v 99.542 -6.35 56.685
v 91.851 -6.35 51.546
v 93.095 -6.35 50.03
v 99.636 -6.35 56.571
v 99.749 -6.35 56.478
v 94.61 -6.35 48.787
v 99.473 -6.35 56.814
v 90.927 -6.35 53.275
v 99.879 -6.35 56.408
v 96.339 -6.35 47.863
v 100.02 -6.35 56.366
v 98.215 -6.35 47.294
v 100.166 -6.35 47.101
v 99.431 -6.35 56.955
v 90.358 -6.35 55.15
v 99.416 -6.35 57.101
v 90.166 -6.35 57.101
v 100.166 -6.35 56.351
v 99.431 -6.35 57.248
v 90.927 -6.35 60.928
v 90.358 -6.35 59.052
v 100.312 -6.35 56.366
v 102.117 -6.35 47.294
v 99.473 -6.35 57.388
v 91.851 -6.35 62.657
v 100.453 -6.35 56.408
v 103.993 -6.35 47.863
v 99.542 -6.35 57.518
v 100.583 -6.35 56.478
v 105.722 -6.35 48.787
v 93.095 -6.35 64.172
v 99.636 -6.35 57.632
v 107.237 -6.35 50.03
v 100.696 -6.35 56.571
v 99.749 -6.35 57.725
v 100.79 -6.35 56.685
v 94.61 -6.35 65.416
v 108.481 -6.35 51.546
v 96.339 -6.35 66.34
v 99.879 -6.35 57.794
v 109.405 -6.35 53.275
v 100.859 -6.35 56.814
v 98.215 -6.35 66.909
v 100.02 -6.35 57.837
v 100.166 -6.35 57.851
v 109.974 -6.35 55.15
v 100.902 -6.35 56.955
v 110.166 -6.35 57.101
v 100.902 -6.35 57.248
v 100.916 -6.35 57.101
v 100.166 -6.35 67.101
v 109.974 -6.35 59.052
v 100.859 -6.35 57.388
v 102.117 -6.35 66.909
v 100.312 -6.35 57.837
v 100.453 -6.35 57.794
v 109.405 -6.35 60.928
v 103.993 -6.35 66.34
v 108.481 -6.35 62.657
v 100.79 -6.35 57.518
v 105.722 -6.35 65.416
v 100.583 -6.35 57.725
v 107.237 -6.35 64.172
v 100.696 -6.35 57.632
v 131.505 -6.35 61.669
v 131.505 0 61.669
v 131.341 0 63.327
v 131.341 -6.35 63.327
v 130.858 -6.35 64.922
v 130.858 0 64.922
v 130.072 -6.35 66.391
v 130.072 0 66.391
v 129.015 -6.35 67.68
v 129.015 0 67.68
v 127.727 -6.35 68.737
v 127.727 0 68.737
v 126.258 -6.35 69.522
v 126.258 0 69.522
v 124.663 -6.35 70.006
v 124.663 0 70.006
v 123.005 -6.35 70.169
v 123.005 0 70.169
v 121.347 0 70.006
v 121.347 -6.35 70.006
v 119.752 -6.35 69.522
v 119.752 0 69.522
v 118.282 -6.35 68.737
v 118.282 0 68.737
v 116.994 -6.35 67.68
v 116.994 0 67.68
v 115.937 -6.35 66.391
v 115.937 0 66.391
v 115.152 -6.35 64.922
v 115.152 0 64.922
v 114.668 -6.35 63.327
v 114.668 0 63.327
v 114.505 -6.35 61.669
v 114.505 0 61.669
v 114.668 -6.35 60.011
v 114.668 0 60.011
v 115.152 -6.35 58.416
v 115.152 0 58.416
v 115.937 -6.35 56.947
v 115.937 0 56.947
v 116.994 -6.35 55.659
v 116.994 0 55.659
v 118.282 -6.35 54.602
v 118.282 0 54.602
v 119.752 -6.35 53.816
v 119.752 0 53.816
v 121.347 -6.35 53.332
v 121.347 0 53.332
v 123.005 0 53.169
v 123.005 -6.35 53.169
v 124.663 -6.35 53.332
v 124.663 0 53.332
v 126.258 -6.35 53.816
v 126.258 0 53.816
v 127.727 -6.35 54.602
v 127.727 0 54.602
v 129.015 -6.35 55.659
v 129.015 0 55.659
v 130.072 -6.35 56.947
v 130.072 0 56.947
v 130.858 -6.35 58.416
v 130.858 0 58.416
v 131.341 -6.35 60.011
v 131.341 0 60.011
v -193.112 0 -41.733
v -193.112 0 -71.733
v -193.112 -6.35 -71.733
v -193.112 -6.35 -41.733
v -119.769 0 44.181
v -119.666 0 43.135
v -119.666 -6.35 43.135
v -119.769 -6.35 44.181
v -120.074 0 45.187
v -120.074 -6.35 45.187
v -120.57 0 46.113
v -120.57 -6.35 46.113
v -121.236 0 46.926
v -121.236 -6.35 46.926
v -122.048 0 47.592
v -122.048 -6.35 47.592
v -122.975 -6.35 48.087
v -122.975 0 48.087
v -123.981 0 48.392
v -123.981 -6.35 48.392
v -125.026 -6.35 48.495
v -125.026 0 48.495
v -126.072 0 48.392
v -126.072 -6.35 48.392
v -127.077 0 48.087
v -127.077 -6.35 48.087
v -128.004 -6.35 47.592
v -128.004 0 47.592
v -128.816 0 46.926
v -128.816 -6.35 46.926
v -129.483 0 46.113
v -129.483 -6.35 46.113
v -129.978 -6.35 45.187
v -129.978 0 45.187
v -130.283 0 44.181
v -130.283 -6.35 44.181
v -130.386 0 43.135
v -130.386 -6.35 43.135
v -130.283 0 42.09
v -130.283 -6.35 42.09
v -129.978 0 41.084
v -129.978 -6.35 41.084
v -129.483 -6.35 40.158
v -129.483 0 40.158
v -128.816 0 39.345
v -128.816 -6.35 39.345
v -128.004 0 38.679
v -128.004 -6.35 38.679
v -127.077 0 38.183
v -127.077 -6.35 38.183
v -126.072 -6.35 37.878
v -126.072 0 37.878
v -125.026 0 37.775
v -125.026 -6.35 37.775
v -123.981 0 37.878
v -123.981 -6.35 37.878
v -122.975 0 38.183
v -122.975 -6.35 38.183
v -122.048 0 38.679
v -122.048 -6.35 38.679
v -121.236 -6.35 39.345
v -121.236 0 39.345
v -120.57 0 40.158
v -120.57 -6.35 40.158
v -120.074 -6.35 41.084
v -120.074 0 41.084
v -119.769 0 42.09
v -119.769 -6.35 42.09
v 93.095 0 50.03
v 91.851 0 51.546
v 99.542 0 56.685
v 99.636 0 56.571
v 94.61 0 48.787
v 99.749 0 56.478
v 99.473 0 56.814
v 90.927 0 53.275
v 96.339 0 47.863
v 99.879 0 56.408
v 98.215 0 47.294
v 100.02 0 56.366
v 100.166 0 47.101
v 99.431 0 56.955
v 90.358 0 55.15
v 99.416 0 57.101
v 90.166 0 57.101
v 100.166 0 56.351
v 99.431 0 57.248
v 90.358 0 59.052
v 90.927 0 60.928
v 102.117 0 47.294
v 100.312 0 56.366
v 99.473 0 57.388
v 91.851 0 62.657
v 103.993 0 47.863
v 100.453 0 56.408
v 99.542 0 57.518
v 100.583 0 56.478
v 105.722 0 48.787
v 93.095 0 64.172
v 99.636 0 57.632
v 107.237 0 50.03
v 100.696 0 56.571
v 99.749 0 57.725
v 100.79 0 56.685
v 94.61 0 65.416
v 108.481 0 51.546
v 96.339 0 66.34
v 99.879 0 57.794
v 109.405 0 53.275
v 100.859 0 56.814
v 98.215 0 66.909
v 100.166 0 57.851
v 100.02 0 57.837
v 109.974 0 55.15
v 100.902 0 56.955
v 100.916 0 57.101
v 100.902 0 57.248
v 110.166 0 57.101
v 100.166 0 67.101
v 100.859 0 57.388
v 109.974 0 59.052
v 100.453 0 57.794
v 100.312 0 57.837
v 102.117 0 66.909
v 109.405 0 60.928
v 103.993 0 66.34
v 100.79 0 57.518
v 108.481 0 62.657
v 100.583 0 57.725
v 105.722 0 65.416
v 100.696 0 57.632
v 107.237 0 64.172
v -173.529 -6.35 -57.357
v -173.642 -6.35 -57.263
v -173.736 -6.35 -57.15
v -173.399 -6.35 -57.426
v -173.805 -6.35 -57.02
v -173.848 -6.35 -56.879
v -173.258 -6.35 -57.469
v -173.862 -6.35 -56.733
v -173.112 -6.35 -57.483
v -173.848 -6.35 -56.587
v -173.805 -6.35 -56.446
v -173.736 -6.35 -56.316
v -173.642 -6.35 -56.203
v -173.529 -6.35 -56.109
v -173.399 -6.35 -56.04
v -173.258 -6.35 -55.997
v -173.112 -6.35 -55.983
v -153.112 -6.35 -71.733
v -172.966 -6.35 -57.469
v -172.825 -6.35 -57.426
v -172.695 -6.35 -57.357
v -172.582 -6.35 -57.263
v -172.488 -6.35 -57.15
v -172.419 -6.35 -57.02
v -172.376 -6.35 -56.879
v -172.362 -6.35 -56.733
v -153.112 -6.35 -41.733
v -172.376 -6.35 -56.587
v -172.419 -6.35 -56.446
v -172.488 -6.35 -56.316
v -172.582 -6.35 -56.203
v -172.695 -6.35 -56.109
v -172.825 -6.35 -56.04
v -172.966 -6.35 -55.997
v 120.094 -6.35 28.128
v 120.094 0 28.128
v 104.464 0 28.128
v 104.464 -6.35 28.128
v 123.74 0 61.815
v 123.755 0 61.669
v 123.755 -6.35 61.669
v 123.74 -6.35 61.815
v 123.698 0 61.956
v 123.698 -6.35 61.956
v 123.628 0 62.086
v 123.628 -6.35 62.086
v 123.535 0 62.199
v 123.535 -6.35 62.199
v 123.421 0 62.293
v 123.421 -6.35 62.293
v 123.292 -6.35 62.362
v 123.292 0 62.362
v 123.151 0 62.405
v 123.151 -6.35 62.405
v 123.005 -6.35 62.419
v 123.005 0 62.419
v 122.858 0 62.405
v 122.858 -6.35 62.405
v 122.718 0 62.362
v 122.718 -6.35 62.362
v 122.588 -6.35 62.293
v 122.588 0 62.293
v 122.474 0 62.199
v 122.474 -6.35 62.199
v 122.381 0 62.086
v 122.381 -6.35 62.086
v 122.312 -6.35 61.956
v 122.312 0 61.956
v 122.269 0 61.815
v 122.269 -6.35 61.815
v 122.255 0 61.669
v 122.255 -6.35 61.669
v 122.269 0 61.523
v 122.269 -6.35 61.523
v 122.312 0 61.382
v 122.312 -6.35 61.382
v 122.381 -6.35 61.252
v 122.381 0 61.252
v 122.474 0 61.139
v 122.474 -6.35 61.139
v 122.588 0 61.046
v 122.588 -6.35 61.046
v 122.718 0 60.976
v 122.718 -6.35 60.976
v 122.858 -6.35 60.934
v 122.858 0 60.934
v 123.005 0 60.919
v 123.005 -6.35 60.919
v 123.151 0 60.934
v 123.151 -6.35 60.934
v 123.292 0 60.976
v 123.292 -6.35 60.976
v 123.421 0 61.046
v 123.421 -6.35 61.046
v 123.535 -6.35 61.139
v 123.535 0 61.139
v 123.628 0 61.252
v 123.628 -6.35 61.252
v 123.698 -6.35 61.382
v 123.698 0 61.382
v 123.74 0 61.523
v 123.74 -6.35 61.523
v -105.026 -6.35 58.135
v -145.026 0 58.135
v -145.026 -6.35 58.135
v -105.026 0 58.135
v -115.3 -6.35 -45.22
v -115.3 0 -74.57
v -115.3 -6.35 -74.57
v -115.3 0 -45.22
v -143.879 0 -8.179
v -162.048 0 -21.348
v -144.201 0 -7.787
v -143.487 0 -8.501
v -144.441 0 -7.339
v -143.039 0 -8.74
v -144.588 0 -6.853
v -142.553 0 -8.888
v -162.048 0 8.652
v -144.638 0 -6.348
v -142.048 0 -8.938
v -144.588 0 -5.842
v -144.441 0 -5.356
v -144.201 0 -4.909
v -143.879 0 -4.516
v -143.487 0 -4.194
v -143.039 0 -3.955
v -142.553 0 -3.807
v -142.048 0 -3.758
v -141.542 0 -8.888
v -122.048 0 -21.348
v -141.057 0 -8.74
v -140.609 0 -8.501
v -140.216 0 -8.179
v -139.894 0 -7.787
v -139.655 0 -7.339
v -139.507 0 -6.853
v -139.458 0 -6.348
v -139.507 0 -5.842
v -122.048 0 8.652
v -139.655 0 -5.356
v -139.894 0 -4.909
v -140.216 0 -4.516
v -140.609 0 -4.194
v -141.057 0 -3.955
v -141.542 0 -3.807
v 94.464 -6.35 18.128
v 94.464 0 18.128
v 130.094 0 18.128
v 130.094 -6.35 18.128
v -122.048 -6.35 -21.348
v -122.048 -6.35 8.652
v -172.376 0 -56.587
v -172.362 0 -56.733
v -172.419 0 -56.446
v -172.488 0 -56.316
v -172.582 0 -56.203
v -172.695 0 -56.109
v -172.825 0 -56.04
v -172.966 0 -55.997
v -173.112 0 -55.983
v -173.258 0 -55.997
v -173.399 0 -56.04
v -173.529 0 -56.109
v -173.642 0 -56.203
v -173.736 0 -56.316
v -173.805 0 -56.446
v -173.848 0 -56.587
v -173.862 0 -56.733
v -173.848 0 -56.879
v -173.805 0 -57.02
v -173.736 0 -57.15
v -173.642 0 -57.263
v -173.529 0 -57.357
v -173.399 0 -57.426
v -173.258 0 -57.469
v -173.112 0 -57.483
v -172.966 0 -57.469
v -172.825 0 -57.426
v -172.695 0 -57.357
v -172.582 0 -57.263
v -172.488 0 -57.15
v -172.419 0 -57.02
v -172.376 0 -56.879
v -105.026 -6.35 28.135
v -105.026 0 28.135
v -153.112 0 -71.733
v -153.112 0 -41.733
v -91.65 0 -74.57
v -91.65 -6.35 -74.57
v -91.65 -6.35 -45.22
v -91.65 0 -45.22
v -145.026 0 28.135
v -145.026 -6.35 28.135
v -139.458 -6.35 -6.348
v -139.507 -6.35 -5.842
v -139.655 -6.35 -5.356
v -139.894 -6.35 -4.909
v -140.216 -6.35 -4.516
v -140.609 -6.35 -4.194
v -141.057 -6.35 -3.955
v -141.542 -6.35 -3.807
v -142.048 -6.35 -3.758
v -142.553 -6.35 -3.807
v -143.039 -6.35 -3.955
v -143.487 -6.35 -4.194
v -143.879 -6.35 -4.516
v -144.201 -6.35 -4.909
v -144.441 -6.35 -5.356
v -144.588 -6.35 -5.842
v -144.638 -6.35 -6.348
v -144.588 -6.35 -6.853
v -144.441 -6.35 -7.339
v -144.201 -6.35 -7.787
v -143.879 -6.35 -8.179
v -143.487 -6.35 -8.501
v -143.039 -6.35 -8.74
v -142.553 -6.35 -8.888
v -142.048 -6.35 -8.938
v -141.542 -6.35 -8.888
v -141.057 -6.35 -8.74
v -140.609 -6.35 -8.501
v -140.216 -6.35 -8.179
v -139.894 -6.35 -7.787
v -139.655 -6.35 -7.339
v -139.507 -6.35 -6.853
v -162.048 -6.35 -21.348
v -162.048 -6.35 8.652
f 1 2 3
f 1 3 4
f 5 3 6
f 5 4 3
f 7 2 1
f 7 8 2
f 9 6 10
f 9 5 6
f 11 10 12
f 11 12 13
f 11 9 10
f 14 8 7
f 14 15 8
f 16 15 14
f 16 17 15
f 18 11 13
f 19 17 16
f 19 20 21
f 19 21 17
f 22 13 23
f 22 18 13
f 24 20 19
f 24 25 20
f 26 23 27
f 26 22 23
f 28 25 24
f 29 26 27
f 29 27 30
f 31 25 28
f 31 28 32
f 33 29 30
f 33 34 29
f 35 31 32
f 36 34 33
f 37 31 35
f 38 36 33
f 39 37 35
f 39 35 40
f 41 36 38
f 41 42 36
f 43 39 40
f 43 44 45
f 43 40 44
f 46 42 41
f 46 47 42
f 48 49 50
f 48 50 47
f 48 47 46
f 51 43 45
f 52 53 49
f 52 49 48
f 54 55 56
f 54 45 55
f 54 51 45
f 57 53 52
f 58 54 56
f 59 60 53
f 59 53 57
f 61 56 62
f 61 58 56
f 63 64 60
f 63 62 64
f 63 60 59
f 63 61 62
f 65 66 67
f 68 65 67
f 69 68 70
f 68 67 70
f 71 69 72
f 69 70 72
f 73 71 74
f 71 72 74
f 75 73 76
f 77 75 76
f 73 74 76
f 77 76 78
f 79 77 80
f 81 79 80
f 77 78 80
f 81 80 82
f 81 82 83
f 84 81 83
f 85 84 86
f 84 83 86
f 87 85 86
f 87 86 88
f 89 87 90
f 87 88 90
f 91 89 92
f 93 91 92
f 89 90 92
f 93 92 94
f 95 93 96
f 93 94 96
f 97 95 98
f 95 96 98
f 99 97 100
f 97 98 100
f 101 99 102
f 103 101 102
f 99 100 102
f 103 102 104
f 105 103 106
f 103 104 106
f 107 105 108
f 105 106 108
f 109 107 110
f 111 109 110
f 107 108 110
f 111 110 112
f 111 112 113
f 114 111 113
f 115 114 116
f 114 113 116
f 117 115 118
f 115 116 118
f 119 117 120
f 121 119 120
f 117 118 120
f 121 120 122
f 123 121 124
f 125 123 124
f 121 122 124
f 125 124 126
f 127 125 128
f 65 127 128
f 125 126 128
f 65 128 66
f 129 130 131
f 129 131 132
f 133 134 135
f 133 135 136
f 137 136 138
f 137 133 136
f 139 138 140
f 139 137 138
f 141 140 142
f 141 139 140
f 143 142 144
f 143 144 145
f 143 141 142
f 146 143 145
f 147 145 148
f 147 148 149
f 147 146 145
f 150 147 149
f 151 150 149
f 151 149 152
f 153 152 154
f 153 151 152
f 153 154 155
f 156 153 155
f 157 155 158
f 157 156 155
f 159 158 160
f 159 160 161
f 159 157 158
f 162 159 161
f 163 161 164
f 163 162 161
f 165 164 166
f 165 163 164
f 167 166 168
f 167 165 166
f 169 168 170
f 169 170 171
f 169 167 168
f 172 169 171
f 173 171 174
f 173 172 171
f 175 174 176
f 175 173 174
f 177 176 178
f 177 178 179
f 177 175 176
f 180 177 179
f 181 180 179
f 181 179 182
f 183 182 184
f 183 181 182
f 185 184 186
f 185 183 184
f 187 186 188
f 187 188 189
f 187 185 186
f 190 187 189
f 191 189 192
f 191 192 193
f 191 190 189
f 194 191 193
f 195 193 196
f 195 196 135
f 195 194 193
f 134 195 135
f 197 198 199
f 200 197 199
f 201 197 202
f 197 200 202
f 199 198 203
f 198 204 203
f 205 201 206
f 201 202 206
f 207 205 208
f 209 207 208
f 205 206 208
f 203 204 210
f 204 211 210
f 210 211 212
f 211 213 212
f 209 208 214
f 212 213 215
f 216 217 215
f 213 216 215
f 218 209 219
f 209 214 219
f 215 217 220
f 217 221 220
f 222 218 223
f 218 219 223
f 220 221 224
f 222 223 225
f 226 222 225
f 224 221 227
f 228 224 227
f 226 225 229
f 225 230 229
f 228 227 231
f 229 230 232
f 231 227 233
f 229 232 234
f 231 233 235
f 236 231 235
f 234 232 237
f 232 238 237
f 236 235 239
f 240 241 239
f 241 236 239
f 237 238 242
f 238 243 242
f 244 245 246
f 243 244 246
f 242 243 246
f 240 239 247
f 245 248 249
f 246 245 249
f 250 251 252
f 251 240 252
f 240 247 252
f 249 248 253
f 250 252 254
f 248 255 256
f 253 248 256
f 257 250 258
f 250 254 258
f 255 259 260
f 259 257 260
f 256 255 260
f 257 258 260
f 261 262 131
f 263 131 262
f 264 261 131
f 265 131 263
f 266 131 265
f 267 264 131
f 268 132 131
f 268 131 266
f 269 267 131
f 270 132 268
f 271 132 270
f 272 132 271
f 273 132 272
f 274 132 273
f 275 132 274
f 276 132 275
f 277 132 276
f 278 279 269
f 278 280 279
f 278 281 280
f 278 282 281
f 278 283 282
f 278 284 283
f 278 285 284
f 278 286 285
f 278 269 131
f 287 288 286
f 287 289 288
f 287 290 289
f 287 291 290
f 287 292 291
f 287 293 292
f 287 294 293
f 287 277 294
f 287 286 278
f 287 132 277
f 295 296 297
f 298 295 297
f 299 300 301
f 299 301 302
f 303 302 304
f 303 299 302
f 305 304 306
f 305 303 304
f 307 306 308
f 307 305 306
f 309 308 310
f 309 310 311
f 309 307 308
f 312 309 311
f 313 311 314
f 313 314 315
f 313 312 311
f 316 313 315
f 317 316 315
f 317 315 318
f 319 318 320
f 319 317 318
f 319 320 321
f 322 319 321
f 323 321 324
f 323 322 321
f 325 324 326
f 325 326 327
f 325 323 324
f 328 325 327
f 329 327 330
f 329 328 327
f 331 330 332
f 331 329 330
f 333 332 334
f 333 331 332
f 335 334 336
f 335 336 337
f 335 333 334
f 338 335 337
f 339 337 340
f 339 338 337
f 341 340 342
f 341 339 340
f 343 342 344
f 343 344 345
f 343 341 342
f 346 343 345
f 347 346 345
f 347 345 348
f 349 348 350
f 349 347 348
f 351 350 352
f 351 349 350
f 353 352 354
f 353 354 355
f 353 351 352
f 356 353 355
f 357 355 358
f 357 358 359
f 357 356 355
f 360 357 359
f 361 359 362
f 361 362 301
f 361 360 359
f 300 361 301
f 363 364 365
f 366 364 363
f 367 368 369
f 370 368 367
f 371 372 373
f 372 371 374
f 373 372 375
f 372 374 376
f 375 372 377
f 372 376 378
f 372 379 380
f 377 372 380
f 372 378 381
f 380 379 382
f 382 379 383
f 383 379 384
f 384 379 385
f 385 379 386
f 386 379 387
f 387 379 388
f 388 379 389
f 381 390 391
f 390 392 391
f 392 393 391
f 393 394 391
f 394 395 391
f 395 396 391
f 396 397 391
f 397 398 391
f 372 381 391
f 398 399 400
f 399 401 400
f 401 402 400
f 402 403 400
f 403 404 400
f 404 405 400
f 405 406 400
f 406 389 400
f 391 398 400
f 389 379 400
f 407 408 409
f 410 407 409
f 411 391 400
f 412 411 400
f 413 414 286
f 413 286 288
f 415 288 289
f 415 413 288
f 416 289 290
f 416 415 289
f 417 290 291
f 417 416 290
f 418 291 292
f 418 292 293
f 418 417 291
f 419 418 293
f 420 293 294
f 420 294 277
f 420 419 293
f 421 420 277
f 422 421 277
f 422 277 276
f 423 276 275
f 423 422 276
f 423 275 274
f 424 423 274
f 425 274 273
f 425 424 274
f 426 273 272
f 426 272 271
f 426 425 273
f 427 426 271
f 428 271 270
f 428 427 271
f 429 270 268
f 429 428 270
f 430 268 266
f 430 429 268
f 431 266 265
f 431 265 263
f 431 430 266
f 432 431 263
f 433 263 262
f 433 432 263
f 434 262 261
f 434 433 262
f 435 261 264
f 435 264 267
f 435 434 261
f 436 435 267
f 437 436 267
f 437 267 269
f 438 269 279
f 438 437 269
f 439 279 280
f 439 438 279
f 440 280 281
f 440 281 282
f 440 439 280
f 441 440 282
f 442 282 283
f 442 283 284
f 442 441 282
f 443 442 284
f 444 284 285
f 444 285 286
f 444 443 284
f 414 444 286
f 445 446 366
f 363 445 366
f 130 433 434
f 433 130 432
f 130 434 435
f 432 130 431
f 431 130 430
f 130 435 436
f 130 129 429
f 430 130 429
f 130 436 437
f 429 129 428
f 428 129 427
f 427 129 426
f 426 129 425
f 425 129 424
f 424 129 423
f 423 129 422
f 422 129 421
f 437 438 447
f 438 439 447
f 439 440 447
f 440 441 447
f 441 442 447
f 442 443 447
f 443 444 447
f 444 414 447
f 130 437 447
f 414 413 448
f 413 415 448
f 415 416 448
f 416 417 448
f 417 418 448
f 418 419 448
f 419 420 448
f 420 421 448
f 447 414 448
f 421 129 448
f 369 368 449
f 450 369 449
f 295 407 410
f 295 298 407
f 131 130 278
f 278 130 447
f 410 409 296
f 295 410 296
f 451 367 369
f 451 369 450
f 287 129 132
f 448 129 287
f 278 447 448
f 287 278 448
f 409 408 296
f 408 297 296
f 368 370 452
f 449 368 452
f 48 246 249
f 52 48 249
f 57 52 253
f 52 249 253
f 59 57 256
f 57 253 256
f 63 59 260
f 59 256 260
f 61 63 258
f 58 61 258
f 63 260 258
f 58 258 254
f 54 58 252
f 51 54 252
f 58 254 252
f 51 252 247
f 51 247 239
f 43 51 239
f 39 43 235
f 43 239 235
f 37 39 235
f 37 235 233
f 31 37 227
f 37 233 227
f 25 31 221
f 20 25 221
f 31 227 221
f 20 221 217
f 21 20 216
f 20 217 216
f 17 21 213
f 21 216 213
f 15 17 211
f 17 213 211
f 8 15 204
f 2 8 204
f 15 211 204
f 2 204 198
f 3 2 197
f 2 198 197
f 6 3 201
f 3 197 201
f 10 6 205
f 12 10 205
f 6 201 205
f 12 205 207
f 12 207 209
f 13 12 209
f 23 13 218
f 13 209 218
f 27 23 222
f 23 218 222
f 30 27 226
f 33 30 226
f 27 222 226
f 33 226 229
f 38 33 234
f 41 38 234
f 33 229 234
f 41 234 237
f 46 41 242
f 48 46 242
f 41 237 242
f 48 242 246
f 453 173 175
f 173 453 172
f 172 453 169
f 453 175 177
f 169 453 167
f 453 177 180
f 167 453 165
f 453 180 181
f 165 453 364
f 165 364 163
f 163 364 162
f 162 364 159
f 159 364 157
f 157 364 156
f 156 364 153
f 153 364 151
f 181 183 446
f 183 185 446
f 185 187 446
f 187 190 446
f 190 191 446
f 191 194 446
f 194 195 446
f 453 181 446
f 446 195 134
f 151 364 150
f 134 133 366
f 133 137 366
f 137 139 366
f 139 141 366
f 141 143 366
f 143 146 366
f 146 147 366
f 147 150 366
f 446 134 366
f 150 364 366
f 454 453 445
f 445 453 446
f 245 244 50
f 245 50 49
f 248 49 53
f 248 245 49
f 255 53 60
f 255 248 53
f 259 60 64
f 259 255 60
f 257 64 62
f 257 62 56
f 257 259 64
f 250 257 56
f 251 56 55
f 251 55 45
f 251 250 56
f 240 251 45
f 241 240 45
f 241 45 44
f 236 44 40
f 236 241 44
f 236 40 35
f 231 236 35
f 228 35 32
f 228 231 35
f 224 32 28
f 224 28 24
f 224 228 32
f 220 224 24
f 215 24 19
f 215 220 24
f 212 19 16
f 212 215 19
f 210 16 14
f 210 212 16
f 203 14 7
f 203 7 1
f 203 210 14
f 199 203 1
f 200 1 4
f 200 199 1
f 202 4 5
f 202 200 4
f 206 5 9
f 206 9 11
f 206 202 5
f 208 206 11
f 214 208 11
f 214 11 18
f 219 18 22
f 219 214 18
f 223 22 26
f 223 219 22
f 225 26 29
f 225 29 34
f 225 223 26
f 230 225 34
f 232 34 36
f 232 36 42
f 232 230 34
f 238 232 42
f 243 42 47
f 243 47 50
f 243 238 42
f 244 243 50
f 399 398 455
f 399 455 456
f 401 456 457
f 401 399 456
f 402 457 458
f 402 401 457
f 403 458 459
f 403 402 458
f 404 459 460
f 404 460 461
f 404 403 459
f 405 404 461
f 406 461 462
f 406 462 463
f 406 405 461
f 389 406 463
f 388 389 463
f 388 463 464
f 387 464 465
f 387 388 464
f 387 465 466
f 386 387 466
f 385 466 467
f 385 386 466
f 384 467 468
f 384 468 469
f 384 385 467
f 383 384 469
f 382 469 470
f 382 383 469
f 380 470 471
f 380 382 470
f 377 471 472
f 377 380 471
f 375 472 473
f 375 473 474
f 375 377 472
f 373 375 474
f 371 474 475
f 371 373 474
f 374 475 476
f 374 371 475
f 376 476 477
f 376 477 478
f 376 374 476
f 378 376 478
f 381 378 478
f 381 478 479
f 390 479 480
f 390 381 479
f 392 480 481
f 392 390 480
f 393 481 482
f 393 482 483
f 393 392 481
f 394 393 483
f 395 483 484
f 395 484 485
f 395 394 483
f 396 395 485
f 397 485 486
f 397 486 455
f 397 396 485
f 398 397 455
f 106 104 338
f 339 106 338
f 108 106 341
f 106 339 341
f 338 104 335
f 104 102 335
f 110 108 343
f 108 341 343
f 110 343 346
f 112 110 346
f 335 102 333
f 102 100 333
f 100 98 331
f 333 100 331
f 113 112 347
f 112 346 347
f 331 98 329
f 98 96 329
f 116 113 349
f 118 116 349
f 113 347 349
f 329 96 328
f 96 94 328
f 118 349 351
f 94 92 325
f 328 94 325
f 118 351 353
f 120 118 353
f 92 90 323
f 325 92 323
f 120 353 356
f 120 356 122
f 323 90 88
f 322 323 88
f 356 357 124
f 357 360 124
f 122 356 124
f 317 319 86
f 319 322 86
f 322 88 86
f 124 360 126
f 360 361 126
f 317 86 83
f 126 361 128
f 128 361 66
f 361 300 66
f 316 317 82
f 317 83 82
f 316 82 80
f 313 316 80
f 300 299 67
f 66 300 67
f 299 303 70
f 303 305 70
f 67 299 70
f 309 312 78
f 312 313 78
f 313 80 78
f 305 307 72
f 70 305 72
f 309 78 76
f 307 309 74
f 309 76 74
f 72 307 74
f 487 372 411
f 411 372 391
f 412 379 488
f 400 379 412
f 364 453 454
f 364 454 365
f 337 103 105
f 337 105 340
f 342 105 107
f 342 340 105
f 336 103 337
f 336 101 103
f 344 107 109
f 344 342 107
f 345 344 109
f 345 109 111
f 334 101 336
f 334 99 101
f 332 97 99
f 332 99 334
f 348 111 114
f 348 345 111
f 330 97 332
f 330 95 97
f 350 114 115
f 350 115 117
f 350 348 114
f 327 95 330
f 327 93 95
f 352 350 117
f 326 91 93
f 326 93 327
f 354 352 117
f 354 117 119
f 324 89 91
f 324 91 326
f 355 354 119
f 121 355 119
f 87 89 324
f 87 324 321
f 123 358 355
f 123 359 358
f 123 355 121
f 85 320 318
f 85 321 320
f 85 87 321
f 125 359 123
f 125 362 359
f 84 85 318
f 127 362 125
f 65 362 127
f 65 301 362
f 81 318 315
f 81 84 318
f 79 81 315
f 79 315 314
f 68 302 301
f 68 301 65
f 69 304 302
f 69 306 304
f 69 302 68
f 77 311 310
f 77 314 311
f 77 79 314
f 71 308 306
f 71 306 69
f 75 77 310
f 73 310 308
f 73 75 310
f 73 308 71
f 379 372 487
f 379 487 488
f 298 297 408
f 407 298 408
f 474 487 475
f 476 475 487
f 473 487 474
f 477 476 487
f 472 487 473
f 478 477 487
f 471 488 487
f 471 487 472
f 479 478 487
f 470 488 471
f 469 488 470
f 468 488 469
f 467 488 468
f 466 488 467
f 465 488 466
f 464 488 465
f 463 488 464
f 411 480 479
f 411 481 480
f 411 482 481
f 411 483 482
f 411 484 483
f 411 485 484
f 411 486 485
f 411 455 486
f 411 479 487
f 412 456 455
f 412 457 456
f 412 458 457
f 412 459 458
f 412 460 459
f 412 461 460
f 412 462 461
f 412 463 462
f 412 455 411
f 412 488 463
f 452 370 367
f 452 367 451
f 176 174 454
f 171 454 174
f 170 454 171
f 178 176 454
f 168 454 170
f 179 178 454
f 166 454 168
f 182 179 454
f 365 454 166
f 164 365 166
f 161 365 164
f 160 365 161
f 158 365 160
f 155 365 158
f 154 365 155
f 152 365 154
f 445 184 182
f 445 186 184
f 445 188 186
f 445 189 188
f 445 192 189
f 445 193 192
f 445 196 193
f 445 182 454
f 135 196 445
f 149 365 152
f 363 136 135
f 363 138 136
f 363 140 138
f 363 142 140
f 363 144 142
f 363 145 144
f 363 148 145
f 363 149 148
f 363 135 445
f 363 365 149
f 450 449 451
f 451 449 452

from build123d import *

# Parameters (mm, degrees)
F0_W     = 23.65
F0_H     = 29.35
F0_R     = 8.5
F0_R_2   = 0.75
F0_W_2   = 40
F0_H_2   = 30
F0_R_3   = 5.36
F0_R_4   = 2.59
F0_R_5   = 10
F1_DEPTH = 6.35


with BuildPart() as f1:
    # F0 (on Front) → F1 (new body)
    with BuildSketch(Plane.XZ):
        with Locations((-103.474769, -59.894982)):
            Rectangle(F0_W, F0_H)
        with Locations((123.004787, 61.669149)):
            Circle(F0_R)
        with Locations((123.004787, 61.669149)):
            Circle(F0_R_2, mode=Mode.SUBTRACT)
        with Locations((-125.026301, 43.135444)):
            Rectangle(F0_W_2, F0_H_2)
        with Locations((-125.026301, 43.135444)):
            Circle(F0_R_3, mode=Mode.SUBTRACT)
        with Locations((-142.047703, -6.347605)):
            Rectangle(F0_W_2, F0_H_2)
        with Locations((-142.047703, -6.347605)):
            Circle(F0_R_4, mode=Mode.SUBTRACT)
        with Locations((-173.111941, -56.733072)):
            Rectangle(F0_W_2, F0_H_2)
        with Locations((-173.111941, -56.733072)):
            Circle(F0_R_2, mode=Mode.SUBTRACT)
        with Locations((100.166097, 57.101402)):
            Circle(F0_R_5)
        with Locations((100.166097, 57.101402)):
            Circle(F0_R_2, mode=Mode.SUBTRACT)
        Polygon((94.463781, 18.128328), (130.093781, 18.128328), (120.093781, 28.128328), (104.463781, 28.128328), align=None)
    extrude(amount=F1_DEPTH)


solid = f1.part
